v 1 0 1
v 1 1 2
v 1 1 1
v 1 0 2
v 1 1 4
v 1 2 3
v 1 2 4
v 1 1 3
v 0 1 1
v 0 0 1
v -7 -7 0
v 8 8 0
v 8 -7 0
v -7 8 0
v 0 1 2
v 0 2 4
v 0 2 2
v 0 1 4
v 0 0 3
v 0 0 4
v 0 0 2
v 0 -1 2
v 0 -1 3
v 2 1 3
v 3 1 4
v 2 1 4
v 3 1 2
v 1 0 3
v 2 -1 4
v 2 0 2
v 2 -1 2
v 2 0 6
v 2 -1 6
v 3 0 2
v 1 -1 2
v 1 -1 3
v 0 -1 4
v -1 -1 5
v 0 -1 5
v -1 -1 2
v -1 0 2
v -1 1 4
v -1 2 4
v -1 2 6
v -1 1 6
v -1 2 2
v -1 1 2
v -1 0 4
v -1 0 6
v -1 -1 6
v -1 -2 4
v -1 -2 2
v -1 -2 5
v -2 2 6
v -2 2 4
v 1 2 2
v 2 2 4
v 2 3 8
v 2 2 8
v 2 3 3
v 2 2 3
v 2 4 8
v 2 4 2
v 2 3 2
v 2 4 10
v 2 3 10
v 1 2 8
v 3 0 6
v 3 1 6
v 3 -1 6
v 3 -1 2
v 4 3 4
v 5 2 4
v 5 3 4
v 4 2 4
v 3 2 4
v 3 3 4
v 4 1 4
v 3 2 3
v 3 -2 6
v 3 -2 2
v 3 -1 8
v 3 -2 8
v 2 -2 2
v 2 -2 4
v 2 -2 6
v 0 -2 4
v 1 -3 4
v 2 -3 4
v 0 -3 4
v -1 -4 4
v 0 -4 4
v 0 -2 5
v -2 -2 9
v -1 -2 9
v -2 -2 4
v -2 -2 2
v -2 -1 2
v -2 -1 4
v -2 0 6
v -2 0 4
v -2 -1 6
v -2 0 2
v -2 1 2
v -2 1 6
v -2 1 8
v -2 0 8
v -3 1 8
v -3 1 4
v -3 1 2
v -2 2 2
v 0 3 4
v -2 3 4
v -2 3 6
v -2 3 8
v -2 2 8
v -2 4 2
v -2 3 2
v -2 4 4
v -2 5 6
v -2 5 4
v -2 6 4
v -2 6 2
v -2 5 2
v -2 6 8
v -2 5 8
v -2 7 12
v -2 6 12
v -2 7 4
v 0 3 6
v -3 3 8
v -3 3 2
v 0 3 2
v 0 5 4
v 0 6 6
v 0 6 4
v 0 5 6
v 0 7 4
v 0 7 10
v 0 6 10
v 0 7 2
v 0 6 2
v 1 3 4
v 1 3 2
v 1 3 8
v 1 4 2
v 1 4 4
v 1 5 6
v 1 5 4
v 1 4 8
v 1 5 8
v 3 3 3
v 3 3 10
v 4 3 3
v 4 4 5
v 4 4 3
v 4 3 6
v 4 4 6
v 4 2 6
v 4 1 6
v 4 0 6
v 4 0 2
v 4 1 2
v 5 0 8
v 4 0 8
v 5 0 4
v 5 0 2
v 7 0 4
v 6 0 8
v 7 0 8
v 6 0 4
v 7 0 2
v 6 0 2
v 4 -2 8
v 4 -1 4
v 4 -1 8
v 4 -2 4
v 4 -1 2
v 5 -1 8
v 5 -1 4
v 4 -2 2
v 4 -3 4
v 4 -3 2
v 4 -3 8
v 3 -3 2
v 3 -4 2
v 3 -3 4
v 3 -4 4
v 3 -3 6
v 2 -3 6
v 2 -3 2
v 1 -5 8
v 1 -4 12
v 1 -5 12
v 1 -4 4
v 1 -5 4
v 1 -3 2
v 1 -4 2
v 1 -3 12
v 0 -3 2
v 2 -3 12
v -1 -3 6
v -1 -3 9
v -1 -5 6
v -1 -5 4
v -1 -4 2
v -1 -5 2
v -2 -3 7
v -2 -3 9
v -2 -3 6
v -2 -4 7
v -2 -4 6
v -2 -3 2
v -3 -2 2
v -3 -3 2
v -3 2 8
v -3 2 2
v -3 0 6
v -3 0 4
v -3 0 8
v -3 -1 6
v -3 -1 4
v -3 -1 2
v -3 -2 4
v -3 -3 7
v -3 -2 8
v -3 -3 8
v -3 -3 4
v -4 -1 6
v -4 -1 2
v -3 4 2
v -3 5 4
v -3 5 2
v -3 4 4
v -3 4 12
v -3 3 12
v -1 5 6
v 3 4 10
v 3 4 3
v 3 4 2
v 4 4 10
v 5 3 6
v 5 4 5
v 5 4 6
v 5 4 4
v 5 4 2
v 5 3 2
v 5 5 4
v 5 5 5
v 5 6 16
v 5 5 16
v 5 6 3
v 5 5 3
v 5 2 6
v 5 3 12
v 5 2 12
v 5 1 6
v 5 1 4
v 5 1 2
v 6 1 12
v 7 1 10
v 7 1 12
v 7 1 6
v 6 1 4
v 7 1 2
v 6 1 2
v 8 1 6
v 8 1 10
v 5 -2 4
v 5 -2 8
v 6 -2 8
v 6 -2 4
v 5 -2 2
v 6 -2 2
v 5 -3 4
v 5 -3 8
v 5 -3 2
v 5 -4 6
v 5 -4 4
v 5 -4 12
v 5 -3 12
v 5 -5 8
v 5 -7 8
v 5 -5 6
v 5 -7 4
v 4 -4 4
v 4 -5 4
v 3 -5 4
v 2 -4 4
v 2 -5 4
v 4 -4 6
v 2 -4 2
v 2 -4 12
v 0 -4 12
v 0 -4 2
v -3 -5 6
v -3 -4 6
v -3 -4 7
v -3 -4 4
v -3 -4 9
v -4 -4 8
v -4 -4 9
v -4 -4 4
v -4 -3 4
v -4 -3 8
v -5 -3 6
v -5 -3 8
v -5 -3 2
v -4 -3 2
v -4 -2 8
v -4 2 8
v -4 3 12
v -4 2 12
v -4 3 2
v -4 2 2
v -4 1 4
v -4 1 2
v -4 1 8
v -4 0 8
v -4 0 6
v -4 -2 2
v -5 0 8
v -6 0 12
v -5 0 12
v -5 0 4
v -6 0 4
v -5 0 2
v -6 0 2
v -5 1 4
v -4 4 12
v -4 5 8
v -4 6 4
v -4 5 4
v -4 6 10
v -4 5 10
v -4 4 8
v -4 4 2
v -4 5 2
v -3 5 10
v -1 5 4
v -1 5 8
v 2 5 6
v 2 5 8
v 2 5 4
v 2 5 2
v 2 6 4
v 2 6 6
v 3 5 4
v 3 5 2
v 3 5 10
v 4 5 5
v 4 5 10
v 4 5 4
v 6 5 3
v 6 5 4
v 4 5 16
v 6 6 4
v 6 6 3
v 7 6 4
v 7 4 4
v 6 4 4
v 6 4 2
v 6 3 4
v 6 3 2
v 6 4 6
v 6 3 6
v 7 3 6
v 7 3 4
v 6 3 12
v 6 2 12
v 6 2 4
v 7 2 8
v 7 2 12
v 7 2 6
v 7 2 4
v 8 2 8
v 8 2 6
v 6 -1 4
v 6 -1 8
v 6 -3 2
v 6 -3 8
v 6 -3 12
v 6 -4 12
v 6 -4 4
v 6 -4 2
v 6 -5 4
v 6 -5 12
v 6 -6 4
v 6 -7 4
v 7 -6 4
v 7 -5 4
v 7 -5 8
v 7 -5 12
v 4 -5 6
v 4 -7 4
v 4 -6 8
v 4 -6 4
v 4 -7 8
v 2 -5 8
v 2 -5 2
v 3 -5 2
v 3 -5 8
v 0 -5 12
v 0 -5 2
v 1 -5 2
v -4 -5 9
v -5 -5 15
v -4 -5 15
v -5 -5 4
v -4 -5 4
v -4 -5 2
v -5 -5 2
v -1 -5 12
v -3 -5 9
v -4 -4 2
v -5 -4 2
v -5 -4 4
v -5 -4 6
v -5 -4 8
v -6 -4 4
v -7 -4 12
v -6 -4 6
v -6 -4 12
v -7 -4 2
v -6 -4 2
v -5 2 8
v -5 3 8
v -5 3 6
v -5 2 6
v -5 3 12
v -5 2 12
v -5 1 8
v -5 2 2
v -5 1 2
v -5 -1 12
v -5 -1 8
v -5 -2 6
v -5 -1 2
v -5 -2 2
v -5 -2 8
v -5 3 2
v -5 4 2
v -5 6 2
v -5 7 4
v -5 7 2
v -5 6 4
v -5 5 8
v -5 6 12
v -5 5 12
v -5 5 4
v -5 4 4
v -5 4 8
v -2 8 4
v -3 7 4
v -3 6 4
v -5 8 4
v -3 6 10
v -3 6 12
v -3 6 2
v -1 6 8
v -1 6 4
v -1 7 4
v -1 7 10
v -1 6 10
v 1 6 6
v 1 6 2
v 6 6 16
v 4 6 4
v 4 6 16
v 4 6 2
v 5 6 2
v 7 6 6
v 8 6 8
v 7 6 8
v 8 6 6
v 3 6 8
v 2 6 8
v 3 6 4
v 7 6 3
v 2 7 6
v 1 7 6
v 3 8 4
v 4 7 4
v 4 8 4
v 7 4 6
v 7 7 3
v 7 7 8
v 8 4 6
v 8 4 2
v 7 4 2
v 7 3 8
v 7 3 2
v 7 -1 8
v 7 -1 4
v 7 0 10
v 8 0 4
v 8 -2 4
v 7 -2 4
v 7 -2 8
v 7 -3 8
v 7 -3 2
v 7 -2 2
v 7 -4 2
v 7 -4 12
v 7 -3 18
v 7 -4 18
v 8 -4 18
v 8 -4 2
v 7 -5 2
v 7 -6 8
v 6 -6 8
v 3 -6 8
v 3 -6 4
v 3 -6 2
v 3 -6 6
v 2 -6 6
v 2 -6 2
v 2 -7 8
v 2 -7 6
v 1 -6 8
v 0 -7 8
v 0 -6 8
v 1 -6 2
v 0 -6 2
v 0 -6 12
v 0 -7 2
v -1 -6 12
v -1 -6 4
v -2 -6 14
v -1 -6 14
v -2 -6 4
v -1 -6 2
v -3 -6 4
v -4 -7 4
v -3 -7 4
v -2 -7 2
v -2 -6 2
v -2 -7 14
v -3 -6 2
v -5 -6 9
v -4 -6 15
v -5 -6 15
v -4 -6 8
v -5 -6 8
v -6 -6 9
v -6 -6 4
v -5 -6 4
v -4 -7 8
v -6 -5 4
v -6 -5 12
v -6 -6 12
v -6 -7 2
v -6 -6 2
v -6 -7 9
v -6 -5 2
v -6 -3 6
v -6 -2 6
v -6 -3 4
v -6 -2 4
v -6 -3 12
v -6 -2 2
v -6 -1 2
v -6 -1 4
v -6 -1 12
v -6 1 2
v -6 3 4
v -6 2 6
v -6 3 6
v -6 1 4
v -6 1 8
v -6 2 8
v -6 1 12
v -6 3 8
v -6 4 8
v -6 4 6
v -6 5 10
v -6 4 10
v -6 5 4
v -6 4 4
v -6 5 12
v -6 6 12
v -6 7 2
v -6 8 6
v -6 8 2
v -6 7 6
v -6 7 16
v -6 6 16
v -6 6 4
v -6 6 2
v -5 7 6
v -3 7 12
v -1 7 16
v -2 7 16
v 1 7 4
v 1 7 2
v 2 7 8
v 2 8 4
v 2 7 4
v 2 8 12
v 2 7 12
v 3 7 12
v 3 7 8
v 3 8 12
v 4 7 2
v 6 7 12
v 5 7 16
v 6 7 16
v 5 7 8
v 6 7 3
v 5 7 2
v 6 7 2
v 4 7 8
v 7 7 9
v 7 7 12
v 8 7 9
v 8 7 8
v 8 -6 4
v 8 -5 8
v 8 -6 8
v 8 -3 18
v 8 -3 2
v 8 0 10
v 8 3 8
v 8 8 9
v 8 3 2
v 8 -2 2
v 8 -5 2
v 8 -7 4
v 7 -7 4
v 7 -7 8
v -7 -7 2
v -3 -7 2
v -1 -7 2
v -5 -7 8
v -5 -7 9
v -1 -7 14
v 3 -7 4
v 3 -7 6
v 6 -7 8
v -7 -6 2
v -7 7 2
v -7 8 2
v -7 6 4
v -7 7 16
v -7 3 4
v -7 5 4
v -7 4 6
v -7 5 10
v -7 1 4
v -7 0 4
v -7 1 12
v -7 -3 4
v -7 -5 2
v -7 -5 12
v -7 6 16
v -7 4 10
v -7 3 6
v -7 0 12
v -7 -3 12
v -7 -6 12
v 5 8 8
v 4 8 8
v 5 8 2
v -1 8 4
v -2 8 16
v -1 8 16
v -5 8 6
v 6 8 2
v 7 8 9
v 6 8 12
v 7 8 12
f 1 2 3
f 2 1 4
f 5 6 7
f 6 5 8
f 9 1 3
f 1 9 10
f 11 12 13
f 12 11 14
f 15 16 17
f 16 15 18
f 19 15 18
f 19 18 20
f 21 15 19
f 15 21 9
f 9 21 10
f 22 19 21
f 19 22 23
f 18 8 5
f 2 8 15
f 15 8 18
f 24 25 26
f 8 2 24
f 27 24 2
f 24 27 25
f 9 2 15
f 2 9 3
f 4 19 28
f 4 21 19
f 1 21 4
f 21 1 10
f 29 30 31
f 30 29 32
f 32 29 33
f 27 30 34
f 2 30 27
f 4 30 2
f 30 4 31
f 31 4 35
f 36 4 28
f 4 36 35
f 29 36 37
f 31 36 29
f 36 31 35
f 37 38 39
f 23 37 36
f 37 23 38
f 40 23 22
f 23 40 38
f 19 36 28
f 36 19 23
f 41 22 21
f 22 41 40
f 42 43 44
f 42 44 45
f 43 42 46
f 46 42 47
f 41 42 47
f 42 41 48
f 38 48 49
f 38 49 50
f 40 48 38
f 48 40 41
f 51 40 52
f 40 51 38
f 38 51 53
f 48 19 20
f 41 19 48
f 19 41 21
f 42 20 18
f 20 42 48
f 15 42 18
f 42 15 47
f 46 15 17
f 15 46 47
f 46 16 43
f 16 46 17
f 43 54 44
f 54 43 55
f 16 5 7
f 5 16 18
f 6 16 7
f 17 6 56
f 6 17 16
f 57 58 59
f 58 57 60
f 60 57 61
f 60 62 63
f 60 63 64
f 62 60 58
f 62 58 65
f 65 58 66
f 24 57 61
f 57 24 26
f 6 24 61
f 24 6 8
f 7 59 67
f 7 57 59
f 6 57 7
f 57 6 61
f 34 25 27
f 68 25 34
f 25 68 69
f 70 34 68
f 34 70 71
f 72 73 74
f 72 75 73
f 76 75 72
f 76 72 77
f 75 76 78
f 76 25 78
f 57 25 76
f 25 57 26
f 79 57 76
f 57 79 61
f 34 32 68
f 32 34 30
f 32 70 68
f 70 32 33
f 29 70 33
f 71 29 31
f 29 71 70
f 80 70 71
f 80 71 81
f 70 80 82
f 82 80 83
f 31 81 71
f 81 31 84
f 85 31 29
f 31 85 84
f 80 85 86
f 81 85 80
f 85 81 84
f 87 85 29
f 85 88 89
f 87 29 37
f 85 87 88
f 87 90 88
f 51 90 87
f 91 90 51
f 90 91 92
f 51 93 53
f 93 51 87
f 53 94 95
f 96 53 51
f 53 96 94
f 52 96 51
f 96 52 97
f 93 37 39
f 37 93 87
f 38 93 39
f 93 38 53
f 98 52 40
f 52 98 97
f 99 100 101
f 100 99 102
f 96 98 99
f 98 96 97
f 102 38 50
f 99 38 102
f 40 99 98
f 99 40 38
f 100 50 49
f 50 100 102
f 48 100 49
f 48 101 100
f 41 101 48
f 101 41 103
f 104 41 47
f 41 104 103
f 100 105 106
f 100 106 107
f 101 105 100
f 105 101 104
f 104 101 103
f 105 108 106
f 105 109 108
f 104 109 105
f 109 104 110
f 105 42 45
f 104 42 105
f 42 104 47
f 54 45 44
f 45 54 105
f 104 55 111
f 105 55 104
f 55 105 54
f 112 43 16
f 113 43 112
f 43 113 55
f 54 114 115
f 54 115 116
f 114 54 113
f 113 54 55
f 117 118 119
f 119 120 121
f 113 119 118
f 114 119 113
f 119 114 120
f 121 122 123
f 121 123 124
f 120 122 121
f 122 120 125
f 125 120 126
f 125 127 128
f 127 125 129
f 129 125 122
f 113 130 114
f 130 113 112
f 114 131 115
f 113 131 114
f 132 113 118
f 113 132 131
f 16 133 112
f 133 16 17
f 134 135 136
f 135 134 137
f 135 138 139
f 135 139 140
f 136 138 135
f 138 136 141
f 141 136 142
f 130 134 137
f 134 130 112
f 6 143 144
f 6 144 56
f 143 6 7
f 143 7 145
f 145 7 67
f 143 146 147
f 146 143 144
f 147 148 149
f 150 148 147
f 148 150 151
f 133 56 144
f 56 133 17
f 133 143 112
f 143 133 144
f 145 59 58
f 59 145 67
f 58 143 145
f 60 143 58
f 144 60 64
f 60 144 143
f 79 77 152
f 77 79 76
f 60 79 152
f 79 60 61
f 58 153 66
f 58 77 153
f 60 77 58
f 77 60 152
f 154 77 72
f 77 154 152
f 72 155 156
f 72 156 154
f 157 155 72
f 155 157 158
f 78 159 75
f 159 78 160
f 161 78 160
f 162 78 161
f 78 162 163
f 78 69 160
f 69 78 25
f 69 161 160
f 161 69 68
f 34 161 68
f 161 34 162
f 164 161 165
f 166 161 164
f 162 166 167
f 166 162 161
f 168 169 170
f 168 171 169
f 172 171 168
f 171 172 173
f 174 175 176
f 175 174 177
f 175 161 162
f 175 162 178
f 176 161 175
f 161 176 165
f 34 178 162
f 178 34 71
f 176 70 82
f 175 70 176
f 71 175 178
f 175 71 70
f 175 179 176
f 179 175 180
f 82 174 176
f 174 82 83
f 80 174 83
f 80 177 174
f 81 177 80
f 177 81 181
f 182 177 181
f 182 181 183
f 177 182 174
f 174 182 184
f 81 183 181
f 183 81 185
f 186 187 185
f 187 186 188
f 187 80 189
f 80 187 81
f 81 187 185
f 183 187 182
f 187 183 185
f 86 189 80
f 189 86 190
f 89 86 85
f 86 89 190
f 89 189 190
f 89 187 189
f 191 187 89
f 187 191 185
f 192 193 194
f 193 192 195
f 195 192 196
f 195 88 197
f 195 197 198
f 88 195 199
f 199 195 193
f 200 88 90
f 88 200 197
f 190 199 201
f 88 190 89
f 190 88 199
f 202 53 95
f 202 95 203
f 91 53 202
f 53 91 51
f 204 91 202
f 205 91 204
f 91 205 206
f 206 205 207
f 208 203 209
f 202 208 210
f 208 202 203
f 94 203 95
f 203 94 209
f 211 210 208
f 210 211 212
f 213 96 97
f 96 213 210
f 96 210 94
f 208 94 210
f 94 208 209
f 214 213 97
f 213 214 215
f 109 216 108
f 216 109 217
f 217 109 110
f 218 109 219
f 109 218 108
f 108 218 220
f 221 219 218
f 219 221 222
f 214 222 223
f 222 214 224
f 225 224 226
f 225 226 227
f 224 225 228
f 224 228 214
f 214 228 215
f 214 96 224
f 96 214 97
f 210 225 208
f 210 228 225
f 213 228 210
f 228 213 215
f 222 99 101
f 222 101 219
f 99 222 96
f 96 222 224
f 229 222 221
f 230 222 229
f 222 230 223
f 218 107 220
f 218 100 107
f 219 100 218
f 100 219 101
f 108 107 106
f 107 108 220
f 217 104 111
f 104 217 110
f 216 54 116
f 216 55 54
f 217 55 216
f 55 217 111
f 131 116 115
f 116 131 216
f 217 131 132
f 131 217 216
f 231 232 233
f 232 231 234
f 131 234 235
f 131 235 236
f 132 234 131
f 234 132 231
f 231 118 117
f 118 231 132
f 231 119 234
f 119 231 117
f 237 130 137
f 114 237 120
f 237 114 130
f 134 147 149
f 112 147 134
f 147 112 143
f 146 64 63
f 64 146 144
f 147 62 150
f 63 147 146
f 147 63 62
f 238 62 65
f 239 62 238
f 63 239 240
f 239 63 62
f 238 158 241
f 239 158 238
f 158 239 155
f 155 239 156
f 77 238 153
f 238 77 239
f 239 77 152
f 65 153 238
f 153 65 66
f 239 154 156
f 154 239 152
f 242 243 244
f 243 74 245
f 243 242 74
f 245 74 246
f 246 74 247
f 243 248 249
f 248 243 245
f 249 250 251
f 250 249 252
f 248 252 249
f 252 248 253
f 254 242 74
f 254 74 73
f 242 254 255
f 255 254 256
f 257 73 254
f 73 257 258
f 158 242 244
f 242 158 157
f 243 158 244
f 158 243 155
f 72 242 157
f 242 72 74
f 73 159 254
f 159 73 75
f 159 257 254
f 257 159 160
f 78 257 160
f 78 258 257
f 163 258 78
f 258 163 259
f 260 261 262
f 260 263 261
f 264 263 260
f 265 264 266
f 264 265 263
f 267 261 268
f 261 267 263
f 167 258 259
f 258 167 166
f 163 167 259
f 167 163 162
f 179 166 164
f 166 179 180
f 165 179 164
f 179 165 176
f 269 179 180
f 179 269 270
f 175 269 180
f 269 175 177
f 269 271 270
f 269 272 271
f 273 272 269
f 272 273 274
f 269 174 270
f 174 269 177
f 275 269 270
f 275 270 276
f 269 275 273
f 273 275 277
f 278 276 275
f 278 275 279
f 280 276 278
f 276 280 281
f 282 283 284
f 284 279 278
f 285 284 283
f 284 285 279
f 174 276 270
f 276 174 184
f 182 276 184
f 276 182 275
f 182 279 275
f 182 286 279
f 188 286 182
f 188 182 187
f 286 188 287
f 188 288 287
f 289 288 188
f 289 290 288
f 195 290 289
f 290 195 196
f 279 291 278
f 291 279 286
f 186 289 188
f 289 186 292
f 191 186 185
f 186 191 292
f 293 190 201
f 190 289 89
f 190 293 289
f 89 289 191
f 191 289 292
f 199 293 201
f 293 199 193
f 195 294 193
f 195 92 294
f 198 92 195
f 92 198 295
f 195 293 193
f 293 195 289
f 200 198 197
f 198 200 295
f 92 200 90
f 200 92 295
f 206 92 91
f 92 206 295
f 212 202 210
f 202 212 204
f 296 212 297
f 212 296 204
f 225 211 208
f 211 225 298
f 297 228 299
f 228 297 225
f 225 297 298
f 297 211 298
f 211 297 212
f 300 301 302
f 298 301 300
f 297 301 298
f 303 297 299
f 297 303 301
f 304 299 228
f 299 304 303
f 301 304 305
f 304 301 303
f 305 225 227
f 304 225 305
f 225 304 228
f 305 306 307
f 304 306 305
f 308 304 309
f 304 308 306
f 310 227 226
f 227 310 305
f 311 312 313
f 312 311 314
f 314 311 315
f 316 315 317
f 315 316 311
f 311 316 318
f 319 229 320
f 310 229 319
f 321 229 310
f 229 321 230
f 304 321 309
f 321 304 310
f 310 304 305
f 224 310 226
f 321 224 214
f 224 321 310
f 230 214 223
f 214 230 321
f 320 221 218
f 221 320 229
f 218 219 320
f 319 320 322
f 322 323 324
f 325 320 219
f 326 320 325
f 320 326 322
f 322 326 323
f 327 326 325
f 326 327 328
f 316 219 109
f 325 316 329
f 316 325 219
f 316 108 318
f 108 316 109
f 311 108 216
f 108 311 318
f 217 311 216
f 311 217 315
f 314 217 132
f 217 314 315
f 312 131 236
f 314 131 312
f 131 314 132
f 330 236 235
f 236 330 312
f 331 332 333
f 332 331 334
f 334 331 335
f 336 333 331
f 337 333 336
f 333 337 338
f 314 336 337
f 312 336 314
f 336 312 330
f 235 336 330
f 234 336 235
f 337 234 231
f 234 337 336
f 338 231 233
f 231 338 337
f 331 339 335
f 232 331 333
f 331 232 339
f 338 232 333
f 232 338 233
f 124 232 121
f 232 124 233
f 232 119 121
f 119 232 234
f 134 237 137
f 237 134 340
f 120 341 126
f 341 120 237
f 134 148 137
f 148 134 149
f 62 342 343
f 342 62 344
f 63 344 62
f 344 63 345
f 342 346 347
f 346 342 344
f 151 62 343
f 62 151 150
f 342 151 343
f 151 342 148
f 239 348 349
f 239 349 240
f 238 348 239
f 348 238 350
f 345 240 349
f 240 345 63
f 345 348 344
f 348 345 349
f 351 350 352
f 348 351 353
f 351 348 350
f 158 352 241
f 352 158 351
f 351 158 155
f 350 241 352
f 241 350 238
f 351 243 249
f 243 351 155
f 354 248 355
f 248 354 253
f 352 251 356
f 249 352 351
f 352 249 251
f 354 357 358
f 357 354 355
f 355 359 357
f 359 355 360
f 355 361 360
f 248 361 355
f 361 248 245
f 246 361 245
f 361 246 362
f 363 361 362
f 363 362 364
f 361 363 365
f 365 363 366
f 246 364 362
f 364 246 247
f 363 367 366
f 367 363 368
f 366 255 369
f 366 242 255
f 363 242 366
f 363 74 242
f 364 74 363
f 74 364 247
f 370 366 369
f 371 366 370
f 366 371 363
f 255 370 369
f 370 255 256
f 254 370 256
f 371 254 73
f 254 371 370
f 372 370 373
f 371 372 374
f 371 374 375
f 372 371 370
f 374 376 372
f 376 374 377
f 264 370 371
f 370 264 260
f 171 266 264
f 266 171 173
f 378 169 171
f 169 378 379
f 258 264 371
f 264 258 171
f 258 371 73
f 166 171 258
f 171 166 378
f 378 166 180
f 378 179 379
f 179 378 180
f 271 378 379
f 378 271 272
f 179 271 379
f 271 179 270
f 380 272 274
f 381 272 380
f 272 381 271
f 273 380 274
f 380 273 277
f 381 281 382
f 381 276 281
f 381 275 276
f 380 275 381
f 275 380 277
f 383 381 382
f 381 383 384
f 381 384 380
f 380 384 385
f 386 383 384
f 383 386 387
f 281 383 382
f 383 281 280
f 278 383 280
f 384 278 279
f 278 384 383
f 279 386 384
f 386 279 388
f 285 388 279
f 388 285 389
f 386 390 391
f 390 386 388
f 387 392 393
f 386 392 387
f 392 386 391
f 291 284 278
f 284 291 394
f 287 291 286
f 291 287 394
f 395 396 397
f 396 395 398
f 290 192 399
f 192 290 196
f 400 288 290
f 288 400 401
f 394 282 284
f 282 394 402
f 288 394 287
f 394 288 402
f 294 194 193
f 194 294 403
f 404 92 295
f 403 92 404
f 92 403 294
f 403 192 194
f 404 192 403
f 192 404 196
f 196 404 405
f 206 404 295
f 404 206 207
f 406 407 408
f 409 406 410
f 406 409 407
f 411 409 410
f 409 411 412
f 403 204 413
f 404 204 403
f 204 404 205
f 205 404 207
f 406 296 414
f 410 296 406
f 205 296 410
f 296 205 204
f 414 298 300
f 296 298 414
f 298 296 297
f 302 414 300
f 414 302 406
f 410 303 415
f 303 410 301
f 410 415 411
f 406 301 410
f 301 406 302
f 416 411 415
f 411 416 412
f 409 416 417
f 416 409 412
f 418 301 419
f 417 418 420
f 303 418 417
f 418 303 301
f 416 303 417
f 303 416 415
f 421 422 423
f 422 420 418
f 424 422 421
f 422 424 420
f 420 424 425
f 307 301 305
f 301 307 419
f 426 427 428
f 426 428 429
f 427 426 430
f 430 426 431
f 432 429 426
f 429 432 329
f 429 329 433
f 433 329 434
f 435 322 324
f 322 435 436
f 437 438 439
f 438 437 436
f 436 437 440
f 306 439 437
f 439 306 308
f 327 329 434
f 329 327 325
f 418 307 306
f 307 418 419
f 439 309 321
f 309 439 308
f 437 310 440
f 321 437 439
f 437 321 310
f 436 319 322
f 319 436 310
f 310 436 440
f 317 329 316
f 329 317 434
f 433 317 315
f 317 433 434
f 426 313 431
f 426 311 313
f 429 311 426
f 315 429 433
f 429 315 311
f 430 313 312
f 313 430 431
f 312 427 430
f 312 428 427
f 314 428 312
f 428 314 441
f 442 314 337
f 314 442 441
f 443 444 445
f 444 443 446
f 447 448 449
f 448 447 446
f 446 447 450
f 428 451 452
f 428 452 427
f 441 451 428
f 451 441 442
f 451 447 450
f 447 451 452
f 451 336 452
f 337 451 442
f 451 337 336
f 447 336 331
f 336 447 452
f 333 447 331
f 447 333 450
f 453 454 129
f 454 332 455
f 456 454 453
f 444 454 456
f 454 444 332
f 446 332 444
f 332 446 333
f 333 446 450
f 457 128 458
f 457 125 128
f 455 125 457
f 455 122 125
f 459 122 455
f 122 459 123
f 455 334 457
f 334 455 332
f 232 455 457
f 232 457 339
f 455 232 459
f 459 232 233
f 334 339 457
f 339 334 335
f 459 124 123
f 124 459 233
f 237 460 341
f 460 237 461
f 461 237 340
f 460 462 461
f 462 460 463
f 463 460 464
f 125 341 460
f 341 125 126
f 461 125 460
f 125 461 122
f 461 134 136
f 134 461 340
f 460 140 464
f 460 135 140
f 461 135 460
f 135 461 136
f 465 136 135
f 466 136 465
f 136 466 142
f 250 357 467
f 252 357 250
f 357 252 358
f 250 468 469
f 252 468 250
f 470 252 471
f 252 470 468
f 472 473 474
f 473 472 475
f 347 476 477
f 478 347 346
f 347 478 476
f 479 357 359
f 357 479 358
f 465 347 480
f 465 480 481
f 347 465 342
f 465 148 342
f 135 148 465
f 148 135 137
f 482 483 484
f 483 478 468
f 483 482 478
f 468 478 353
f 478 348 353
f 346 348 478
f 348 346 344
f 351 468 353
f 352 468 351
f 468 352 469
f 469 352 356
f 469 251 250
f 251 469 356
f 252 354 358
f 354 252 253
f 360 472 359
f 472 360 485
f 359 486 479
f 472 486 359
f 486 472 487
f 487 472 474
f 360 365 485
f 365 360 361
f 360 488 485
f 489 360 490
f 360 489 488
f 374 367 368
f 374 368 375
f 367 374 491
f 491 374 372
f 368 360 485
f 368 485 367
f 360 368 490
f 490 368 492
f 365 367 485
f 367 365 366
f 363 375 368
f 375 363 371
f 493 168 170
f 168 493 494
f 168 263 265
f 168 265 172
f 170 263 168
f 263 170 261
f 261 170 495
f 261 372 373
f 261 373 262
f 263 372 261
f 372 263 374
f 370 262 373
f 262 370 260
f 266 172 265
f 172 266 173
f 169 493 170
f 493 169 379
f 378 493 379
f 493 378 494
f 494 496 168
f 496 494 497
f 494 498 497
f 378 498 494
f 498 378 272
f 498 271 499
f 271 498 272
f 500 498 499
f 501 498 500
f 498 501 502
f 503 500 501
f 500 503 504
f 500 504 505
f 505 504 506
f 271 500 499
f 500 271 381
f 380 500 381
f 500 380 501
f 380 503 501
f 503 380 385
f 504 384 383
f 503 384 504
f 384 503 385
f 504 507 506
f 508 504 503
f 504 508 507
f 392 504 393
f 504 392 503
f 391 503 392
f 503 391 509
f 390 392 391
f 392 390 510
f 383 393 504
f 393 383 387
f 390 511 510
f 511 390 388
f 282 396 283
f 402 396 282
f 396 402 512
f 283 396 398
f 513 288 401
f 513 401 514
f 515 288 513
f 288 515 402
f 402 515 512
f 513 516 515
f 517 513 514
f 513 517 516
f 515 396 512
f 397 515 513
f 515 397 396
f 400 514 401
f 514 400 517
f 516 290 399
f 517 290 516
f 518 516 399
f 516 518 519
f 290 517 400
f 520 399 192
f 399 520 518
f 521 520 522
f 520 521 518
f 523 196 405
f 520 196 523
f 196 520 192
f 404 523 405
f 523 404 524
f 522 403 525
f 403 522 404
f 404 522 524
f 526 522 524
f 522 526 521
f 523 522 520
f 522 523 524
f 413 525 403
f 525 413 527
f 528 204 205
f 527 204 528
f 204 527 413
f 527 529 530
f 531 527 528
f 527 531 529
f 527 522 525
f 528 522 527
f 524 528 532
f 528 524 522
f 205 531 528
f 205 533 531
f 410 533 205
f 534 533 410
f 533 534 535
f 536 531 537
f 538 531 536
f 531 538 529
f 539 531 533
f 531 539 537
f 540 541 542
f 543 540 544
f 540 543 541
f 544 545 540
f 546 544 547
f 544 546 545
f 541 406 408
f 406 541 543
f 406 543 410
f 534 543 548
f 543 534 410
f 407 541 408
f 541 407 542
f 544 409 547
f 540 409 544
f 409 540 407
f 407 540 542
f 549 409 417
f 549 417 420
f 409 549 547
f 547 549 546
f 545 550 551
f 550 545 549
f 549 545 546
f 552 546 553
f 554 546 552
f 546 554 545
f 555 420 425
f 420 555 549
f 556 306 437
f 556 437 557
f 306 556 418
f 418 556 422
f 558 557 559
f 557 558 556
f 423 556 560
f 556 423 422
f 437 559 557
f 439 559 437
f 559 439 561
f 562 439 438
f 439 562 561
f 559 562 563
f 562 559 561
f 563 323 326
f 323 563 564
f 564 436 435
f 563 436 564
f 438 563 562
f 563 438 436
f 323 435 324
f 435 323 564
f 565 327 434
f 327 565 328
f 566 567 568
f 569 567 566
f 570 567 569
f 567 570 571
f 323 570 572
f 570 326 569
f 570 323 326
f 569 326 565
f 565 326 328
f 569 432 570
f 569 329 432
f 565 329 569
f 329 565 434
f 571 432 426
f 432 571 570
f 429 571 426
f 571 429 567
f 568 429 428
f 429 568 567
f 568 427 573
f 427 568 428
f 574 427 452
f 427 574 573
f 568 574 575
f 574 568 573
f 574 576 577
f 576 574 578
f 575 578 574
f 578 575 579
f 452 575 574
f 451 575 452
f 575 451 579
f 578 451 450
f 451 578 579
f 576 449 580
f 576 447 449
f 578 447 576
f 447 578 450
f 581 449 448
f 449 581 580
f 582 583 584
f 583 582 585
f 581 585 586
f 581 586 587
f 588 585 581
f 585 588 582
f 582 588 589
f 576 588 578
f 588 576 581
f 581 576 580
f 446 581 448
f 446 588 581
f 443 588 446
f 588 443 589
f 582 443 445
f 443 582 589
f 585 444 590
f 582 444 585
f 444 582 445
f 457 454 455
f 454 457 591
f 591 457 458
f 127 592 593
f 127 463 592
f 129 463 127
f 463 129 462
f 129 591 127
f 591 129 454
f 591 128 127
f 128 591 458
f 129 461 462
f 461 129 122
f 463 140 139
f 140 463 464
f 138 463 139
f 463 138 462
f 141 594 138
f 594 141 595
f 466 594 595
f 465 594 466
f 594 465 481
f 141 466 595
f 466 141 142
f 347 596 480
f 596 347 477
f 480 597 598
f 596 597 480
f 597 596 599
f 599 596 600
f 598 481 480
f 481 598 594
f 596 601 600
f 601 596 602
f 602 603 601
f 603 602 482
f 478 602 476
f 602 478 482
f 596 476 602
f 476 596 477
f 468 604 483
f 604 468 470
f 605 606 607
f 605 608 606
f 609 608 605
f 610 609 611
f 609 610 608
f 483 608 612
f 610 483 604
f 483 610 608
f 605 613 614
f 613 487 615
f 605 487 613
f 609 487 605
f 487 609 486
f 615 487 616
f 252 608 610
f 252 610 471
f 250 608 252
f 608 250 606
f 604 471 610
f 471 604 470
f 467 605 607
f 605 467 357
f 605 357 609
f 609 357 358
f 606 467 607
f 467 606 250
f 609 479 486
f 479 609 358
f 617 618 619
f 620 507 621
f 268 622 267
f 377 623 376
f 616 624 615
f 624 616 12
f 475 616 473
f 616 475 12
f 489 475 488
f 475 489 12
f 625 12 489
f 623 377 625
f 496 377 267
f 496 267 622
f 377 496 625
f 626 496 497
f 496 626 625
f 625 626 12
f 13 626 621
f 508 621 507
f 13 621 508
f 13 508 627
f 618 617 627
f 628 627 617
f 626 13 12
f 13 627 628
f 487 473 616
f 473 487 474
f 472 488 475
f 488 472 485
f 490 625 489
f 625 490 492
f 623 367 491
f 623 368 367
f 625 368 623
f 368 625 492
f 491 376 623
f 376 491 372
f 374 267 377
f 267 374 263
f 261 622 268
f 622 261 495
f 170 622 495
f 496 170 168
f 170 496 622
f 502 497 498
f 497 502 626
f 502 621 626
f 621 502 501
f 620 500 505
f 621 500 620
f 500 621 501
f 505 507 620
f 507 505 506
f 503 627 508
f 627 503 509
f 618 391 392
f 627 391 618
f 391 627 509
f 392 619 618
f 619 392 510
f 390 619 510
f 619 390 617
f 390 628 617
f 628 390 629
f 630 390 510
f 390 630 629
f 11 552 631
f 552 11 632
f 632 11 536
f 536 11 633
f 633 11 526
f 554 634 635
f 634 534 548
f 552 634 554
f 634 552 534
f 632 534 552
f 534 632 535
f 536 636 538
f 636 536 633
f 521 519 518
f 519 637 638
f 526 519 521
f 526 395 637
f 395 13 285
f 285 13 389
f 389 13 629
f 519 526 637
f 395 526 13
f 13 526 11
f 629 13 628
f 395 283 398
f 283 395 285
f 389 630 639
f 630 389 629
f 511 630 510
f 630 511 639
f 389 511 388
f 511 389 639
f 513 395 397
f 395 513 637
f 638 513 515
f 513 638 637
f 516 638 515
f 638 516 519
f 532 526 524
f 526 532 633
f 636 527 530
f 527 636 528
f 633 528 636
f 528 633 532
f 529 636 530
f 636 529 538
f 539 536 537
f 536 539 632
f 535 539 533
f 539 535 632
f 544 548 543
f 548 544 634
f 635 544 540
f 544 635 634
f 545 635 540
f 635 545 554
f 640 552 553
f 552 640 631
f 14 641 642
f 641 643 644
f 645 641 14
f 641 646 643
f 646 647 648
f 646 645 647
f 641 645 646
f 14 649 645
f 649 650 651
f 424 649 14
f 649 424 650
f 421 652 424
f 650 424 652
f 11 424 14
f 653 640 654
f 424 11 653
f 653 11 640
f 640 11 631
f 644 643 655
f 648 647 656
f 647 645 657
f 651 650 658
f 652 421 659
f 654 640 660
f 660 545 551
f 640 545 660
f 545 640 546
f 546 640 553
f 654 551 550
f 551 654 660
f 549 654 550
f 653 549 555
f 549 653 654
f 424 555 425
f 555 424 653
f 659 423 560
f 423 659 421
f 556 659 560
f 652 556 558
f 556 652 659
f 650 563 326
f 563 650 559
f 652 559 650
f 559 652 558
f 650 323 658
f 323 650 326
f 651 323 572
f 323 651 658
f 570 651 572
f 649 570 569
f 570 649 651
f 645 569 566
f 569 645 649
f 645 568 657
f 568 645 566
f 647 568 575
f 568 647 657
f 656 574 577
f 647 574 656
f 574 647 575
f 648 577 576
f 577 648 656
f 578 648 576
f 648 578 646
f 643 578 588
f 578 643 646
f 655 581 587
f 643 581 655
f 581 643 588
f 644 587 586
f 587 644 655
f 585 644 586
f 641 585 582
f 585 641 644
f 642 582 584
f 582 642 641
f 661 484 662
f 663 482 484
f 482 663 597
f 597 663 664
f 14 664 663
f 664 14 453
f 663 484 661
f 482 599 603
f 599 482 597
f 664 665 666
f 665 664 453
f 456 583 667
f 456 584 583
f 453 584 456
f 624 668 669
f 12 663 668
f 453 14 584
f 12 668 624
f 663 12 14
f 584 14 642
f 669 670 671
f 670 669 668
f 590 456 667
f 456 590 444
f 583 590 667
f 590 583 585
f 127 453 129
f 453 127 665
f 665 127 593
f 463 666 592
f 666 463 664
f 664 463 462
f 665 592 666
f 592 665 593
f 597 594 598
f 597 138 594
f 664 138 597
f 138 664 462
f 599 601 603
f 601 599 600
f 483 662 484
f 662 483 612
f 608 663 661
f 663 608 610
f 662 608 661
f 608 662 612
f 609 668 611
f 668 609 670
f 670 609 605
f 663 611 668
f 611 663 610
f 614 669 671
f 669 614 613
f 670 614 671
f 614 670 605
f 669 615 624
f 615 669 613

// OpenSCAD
color("white"){
    ulam(225);
}

module ulam(n){
    for (i=[1:n]){
        x = floor((sqrt(i)-1)/2) - 
            min(ceil((sqrt(i)-1)/2)*2, 
                max(0,i-floor((sqrt(i)+1)/2)*2-
                        pow(floor((sqrt(i)+1)/2)*2-1,2))) + 
            min(ceil((sqrt(i)-1)/2)*2, 
                max(0,i-floor((sqrt(i)+1)/2)*6-
                        pow(floor((sqrt(i)+1)/2)*2-1,2))) + 
            ((floor((sqrt(i)-1)/2)==(sqrt(i)-1)/2)?0:1);

        y = floor((sqrt(i)-1)/2) - 
            min(ceil((sqrt(i)-1)/2)*2-1, 
                max(0,i-1-pow(floor((sqrt(i)+1)/2)*2-1,2))) + 
            min(ceil((sqrt(i)-1)/2)*2, 
                max(0,i-floor((sqrt(i)+1)/2)*4-
                        pow(floor((sqrt(i)+1)/2)*2-1,2))) +
            ((i==1)?-1:0);
        translate([x,y,0]){
            cube([1,1,divisors(i,1)]);
        }
    }
}

function divisors(n, i) = (i==n)?1:(divisors(n,i+1) + ((n%i==0)?1:0));
function height(n) = pow(2, 4-divisors(n,1))+1;
